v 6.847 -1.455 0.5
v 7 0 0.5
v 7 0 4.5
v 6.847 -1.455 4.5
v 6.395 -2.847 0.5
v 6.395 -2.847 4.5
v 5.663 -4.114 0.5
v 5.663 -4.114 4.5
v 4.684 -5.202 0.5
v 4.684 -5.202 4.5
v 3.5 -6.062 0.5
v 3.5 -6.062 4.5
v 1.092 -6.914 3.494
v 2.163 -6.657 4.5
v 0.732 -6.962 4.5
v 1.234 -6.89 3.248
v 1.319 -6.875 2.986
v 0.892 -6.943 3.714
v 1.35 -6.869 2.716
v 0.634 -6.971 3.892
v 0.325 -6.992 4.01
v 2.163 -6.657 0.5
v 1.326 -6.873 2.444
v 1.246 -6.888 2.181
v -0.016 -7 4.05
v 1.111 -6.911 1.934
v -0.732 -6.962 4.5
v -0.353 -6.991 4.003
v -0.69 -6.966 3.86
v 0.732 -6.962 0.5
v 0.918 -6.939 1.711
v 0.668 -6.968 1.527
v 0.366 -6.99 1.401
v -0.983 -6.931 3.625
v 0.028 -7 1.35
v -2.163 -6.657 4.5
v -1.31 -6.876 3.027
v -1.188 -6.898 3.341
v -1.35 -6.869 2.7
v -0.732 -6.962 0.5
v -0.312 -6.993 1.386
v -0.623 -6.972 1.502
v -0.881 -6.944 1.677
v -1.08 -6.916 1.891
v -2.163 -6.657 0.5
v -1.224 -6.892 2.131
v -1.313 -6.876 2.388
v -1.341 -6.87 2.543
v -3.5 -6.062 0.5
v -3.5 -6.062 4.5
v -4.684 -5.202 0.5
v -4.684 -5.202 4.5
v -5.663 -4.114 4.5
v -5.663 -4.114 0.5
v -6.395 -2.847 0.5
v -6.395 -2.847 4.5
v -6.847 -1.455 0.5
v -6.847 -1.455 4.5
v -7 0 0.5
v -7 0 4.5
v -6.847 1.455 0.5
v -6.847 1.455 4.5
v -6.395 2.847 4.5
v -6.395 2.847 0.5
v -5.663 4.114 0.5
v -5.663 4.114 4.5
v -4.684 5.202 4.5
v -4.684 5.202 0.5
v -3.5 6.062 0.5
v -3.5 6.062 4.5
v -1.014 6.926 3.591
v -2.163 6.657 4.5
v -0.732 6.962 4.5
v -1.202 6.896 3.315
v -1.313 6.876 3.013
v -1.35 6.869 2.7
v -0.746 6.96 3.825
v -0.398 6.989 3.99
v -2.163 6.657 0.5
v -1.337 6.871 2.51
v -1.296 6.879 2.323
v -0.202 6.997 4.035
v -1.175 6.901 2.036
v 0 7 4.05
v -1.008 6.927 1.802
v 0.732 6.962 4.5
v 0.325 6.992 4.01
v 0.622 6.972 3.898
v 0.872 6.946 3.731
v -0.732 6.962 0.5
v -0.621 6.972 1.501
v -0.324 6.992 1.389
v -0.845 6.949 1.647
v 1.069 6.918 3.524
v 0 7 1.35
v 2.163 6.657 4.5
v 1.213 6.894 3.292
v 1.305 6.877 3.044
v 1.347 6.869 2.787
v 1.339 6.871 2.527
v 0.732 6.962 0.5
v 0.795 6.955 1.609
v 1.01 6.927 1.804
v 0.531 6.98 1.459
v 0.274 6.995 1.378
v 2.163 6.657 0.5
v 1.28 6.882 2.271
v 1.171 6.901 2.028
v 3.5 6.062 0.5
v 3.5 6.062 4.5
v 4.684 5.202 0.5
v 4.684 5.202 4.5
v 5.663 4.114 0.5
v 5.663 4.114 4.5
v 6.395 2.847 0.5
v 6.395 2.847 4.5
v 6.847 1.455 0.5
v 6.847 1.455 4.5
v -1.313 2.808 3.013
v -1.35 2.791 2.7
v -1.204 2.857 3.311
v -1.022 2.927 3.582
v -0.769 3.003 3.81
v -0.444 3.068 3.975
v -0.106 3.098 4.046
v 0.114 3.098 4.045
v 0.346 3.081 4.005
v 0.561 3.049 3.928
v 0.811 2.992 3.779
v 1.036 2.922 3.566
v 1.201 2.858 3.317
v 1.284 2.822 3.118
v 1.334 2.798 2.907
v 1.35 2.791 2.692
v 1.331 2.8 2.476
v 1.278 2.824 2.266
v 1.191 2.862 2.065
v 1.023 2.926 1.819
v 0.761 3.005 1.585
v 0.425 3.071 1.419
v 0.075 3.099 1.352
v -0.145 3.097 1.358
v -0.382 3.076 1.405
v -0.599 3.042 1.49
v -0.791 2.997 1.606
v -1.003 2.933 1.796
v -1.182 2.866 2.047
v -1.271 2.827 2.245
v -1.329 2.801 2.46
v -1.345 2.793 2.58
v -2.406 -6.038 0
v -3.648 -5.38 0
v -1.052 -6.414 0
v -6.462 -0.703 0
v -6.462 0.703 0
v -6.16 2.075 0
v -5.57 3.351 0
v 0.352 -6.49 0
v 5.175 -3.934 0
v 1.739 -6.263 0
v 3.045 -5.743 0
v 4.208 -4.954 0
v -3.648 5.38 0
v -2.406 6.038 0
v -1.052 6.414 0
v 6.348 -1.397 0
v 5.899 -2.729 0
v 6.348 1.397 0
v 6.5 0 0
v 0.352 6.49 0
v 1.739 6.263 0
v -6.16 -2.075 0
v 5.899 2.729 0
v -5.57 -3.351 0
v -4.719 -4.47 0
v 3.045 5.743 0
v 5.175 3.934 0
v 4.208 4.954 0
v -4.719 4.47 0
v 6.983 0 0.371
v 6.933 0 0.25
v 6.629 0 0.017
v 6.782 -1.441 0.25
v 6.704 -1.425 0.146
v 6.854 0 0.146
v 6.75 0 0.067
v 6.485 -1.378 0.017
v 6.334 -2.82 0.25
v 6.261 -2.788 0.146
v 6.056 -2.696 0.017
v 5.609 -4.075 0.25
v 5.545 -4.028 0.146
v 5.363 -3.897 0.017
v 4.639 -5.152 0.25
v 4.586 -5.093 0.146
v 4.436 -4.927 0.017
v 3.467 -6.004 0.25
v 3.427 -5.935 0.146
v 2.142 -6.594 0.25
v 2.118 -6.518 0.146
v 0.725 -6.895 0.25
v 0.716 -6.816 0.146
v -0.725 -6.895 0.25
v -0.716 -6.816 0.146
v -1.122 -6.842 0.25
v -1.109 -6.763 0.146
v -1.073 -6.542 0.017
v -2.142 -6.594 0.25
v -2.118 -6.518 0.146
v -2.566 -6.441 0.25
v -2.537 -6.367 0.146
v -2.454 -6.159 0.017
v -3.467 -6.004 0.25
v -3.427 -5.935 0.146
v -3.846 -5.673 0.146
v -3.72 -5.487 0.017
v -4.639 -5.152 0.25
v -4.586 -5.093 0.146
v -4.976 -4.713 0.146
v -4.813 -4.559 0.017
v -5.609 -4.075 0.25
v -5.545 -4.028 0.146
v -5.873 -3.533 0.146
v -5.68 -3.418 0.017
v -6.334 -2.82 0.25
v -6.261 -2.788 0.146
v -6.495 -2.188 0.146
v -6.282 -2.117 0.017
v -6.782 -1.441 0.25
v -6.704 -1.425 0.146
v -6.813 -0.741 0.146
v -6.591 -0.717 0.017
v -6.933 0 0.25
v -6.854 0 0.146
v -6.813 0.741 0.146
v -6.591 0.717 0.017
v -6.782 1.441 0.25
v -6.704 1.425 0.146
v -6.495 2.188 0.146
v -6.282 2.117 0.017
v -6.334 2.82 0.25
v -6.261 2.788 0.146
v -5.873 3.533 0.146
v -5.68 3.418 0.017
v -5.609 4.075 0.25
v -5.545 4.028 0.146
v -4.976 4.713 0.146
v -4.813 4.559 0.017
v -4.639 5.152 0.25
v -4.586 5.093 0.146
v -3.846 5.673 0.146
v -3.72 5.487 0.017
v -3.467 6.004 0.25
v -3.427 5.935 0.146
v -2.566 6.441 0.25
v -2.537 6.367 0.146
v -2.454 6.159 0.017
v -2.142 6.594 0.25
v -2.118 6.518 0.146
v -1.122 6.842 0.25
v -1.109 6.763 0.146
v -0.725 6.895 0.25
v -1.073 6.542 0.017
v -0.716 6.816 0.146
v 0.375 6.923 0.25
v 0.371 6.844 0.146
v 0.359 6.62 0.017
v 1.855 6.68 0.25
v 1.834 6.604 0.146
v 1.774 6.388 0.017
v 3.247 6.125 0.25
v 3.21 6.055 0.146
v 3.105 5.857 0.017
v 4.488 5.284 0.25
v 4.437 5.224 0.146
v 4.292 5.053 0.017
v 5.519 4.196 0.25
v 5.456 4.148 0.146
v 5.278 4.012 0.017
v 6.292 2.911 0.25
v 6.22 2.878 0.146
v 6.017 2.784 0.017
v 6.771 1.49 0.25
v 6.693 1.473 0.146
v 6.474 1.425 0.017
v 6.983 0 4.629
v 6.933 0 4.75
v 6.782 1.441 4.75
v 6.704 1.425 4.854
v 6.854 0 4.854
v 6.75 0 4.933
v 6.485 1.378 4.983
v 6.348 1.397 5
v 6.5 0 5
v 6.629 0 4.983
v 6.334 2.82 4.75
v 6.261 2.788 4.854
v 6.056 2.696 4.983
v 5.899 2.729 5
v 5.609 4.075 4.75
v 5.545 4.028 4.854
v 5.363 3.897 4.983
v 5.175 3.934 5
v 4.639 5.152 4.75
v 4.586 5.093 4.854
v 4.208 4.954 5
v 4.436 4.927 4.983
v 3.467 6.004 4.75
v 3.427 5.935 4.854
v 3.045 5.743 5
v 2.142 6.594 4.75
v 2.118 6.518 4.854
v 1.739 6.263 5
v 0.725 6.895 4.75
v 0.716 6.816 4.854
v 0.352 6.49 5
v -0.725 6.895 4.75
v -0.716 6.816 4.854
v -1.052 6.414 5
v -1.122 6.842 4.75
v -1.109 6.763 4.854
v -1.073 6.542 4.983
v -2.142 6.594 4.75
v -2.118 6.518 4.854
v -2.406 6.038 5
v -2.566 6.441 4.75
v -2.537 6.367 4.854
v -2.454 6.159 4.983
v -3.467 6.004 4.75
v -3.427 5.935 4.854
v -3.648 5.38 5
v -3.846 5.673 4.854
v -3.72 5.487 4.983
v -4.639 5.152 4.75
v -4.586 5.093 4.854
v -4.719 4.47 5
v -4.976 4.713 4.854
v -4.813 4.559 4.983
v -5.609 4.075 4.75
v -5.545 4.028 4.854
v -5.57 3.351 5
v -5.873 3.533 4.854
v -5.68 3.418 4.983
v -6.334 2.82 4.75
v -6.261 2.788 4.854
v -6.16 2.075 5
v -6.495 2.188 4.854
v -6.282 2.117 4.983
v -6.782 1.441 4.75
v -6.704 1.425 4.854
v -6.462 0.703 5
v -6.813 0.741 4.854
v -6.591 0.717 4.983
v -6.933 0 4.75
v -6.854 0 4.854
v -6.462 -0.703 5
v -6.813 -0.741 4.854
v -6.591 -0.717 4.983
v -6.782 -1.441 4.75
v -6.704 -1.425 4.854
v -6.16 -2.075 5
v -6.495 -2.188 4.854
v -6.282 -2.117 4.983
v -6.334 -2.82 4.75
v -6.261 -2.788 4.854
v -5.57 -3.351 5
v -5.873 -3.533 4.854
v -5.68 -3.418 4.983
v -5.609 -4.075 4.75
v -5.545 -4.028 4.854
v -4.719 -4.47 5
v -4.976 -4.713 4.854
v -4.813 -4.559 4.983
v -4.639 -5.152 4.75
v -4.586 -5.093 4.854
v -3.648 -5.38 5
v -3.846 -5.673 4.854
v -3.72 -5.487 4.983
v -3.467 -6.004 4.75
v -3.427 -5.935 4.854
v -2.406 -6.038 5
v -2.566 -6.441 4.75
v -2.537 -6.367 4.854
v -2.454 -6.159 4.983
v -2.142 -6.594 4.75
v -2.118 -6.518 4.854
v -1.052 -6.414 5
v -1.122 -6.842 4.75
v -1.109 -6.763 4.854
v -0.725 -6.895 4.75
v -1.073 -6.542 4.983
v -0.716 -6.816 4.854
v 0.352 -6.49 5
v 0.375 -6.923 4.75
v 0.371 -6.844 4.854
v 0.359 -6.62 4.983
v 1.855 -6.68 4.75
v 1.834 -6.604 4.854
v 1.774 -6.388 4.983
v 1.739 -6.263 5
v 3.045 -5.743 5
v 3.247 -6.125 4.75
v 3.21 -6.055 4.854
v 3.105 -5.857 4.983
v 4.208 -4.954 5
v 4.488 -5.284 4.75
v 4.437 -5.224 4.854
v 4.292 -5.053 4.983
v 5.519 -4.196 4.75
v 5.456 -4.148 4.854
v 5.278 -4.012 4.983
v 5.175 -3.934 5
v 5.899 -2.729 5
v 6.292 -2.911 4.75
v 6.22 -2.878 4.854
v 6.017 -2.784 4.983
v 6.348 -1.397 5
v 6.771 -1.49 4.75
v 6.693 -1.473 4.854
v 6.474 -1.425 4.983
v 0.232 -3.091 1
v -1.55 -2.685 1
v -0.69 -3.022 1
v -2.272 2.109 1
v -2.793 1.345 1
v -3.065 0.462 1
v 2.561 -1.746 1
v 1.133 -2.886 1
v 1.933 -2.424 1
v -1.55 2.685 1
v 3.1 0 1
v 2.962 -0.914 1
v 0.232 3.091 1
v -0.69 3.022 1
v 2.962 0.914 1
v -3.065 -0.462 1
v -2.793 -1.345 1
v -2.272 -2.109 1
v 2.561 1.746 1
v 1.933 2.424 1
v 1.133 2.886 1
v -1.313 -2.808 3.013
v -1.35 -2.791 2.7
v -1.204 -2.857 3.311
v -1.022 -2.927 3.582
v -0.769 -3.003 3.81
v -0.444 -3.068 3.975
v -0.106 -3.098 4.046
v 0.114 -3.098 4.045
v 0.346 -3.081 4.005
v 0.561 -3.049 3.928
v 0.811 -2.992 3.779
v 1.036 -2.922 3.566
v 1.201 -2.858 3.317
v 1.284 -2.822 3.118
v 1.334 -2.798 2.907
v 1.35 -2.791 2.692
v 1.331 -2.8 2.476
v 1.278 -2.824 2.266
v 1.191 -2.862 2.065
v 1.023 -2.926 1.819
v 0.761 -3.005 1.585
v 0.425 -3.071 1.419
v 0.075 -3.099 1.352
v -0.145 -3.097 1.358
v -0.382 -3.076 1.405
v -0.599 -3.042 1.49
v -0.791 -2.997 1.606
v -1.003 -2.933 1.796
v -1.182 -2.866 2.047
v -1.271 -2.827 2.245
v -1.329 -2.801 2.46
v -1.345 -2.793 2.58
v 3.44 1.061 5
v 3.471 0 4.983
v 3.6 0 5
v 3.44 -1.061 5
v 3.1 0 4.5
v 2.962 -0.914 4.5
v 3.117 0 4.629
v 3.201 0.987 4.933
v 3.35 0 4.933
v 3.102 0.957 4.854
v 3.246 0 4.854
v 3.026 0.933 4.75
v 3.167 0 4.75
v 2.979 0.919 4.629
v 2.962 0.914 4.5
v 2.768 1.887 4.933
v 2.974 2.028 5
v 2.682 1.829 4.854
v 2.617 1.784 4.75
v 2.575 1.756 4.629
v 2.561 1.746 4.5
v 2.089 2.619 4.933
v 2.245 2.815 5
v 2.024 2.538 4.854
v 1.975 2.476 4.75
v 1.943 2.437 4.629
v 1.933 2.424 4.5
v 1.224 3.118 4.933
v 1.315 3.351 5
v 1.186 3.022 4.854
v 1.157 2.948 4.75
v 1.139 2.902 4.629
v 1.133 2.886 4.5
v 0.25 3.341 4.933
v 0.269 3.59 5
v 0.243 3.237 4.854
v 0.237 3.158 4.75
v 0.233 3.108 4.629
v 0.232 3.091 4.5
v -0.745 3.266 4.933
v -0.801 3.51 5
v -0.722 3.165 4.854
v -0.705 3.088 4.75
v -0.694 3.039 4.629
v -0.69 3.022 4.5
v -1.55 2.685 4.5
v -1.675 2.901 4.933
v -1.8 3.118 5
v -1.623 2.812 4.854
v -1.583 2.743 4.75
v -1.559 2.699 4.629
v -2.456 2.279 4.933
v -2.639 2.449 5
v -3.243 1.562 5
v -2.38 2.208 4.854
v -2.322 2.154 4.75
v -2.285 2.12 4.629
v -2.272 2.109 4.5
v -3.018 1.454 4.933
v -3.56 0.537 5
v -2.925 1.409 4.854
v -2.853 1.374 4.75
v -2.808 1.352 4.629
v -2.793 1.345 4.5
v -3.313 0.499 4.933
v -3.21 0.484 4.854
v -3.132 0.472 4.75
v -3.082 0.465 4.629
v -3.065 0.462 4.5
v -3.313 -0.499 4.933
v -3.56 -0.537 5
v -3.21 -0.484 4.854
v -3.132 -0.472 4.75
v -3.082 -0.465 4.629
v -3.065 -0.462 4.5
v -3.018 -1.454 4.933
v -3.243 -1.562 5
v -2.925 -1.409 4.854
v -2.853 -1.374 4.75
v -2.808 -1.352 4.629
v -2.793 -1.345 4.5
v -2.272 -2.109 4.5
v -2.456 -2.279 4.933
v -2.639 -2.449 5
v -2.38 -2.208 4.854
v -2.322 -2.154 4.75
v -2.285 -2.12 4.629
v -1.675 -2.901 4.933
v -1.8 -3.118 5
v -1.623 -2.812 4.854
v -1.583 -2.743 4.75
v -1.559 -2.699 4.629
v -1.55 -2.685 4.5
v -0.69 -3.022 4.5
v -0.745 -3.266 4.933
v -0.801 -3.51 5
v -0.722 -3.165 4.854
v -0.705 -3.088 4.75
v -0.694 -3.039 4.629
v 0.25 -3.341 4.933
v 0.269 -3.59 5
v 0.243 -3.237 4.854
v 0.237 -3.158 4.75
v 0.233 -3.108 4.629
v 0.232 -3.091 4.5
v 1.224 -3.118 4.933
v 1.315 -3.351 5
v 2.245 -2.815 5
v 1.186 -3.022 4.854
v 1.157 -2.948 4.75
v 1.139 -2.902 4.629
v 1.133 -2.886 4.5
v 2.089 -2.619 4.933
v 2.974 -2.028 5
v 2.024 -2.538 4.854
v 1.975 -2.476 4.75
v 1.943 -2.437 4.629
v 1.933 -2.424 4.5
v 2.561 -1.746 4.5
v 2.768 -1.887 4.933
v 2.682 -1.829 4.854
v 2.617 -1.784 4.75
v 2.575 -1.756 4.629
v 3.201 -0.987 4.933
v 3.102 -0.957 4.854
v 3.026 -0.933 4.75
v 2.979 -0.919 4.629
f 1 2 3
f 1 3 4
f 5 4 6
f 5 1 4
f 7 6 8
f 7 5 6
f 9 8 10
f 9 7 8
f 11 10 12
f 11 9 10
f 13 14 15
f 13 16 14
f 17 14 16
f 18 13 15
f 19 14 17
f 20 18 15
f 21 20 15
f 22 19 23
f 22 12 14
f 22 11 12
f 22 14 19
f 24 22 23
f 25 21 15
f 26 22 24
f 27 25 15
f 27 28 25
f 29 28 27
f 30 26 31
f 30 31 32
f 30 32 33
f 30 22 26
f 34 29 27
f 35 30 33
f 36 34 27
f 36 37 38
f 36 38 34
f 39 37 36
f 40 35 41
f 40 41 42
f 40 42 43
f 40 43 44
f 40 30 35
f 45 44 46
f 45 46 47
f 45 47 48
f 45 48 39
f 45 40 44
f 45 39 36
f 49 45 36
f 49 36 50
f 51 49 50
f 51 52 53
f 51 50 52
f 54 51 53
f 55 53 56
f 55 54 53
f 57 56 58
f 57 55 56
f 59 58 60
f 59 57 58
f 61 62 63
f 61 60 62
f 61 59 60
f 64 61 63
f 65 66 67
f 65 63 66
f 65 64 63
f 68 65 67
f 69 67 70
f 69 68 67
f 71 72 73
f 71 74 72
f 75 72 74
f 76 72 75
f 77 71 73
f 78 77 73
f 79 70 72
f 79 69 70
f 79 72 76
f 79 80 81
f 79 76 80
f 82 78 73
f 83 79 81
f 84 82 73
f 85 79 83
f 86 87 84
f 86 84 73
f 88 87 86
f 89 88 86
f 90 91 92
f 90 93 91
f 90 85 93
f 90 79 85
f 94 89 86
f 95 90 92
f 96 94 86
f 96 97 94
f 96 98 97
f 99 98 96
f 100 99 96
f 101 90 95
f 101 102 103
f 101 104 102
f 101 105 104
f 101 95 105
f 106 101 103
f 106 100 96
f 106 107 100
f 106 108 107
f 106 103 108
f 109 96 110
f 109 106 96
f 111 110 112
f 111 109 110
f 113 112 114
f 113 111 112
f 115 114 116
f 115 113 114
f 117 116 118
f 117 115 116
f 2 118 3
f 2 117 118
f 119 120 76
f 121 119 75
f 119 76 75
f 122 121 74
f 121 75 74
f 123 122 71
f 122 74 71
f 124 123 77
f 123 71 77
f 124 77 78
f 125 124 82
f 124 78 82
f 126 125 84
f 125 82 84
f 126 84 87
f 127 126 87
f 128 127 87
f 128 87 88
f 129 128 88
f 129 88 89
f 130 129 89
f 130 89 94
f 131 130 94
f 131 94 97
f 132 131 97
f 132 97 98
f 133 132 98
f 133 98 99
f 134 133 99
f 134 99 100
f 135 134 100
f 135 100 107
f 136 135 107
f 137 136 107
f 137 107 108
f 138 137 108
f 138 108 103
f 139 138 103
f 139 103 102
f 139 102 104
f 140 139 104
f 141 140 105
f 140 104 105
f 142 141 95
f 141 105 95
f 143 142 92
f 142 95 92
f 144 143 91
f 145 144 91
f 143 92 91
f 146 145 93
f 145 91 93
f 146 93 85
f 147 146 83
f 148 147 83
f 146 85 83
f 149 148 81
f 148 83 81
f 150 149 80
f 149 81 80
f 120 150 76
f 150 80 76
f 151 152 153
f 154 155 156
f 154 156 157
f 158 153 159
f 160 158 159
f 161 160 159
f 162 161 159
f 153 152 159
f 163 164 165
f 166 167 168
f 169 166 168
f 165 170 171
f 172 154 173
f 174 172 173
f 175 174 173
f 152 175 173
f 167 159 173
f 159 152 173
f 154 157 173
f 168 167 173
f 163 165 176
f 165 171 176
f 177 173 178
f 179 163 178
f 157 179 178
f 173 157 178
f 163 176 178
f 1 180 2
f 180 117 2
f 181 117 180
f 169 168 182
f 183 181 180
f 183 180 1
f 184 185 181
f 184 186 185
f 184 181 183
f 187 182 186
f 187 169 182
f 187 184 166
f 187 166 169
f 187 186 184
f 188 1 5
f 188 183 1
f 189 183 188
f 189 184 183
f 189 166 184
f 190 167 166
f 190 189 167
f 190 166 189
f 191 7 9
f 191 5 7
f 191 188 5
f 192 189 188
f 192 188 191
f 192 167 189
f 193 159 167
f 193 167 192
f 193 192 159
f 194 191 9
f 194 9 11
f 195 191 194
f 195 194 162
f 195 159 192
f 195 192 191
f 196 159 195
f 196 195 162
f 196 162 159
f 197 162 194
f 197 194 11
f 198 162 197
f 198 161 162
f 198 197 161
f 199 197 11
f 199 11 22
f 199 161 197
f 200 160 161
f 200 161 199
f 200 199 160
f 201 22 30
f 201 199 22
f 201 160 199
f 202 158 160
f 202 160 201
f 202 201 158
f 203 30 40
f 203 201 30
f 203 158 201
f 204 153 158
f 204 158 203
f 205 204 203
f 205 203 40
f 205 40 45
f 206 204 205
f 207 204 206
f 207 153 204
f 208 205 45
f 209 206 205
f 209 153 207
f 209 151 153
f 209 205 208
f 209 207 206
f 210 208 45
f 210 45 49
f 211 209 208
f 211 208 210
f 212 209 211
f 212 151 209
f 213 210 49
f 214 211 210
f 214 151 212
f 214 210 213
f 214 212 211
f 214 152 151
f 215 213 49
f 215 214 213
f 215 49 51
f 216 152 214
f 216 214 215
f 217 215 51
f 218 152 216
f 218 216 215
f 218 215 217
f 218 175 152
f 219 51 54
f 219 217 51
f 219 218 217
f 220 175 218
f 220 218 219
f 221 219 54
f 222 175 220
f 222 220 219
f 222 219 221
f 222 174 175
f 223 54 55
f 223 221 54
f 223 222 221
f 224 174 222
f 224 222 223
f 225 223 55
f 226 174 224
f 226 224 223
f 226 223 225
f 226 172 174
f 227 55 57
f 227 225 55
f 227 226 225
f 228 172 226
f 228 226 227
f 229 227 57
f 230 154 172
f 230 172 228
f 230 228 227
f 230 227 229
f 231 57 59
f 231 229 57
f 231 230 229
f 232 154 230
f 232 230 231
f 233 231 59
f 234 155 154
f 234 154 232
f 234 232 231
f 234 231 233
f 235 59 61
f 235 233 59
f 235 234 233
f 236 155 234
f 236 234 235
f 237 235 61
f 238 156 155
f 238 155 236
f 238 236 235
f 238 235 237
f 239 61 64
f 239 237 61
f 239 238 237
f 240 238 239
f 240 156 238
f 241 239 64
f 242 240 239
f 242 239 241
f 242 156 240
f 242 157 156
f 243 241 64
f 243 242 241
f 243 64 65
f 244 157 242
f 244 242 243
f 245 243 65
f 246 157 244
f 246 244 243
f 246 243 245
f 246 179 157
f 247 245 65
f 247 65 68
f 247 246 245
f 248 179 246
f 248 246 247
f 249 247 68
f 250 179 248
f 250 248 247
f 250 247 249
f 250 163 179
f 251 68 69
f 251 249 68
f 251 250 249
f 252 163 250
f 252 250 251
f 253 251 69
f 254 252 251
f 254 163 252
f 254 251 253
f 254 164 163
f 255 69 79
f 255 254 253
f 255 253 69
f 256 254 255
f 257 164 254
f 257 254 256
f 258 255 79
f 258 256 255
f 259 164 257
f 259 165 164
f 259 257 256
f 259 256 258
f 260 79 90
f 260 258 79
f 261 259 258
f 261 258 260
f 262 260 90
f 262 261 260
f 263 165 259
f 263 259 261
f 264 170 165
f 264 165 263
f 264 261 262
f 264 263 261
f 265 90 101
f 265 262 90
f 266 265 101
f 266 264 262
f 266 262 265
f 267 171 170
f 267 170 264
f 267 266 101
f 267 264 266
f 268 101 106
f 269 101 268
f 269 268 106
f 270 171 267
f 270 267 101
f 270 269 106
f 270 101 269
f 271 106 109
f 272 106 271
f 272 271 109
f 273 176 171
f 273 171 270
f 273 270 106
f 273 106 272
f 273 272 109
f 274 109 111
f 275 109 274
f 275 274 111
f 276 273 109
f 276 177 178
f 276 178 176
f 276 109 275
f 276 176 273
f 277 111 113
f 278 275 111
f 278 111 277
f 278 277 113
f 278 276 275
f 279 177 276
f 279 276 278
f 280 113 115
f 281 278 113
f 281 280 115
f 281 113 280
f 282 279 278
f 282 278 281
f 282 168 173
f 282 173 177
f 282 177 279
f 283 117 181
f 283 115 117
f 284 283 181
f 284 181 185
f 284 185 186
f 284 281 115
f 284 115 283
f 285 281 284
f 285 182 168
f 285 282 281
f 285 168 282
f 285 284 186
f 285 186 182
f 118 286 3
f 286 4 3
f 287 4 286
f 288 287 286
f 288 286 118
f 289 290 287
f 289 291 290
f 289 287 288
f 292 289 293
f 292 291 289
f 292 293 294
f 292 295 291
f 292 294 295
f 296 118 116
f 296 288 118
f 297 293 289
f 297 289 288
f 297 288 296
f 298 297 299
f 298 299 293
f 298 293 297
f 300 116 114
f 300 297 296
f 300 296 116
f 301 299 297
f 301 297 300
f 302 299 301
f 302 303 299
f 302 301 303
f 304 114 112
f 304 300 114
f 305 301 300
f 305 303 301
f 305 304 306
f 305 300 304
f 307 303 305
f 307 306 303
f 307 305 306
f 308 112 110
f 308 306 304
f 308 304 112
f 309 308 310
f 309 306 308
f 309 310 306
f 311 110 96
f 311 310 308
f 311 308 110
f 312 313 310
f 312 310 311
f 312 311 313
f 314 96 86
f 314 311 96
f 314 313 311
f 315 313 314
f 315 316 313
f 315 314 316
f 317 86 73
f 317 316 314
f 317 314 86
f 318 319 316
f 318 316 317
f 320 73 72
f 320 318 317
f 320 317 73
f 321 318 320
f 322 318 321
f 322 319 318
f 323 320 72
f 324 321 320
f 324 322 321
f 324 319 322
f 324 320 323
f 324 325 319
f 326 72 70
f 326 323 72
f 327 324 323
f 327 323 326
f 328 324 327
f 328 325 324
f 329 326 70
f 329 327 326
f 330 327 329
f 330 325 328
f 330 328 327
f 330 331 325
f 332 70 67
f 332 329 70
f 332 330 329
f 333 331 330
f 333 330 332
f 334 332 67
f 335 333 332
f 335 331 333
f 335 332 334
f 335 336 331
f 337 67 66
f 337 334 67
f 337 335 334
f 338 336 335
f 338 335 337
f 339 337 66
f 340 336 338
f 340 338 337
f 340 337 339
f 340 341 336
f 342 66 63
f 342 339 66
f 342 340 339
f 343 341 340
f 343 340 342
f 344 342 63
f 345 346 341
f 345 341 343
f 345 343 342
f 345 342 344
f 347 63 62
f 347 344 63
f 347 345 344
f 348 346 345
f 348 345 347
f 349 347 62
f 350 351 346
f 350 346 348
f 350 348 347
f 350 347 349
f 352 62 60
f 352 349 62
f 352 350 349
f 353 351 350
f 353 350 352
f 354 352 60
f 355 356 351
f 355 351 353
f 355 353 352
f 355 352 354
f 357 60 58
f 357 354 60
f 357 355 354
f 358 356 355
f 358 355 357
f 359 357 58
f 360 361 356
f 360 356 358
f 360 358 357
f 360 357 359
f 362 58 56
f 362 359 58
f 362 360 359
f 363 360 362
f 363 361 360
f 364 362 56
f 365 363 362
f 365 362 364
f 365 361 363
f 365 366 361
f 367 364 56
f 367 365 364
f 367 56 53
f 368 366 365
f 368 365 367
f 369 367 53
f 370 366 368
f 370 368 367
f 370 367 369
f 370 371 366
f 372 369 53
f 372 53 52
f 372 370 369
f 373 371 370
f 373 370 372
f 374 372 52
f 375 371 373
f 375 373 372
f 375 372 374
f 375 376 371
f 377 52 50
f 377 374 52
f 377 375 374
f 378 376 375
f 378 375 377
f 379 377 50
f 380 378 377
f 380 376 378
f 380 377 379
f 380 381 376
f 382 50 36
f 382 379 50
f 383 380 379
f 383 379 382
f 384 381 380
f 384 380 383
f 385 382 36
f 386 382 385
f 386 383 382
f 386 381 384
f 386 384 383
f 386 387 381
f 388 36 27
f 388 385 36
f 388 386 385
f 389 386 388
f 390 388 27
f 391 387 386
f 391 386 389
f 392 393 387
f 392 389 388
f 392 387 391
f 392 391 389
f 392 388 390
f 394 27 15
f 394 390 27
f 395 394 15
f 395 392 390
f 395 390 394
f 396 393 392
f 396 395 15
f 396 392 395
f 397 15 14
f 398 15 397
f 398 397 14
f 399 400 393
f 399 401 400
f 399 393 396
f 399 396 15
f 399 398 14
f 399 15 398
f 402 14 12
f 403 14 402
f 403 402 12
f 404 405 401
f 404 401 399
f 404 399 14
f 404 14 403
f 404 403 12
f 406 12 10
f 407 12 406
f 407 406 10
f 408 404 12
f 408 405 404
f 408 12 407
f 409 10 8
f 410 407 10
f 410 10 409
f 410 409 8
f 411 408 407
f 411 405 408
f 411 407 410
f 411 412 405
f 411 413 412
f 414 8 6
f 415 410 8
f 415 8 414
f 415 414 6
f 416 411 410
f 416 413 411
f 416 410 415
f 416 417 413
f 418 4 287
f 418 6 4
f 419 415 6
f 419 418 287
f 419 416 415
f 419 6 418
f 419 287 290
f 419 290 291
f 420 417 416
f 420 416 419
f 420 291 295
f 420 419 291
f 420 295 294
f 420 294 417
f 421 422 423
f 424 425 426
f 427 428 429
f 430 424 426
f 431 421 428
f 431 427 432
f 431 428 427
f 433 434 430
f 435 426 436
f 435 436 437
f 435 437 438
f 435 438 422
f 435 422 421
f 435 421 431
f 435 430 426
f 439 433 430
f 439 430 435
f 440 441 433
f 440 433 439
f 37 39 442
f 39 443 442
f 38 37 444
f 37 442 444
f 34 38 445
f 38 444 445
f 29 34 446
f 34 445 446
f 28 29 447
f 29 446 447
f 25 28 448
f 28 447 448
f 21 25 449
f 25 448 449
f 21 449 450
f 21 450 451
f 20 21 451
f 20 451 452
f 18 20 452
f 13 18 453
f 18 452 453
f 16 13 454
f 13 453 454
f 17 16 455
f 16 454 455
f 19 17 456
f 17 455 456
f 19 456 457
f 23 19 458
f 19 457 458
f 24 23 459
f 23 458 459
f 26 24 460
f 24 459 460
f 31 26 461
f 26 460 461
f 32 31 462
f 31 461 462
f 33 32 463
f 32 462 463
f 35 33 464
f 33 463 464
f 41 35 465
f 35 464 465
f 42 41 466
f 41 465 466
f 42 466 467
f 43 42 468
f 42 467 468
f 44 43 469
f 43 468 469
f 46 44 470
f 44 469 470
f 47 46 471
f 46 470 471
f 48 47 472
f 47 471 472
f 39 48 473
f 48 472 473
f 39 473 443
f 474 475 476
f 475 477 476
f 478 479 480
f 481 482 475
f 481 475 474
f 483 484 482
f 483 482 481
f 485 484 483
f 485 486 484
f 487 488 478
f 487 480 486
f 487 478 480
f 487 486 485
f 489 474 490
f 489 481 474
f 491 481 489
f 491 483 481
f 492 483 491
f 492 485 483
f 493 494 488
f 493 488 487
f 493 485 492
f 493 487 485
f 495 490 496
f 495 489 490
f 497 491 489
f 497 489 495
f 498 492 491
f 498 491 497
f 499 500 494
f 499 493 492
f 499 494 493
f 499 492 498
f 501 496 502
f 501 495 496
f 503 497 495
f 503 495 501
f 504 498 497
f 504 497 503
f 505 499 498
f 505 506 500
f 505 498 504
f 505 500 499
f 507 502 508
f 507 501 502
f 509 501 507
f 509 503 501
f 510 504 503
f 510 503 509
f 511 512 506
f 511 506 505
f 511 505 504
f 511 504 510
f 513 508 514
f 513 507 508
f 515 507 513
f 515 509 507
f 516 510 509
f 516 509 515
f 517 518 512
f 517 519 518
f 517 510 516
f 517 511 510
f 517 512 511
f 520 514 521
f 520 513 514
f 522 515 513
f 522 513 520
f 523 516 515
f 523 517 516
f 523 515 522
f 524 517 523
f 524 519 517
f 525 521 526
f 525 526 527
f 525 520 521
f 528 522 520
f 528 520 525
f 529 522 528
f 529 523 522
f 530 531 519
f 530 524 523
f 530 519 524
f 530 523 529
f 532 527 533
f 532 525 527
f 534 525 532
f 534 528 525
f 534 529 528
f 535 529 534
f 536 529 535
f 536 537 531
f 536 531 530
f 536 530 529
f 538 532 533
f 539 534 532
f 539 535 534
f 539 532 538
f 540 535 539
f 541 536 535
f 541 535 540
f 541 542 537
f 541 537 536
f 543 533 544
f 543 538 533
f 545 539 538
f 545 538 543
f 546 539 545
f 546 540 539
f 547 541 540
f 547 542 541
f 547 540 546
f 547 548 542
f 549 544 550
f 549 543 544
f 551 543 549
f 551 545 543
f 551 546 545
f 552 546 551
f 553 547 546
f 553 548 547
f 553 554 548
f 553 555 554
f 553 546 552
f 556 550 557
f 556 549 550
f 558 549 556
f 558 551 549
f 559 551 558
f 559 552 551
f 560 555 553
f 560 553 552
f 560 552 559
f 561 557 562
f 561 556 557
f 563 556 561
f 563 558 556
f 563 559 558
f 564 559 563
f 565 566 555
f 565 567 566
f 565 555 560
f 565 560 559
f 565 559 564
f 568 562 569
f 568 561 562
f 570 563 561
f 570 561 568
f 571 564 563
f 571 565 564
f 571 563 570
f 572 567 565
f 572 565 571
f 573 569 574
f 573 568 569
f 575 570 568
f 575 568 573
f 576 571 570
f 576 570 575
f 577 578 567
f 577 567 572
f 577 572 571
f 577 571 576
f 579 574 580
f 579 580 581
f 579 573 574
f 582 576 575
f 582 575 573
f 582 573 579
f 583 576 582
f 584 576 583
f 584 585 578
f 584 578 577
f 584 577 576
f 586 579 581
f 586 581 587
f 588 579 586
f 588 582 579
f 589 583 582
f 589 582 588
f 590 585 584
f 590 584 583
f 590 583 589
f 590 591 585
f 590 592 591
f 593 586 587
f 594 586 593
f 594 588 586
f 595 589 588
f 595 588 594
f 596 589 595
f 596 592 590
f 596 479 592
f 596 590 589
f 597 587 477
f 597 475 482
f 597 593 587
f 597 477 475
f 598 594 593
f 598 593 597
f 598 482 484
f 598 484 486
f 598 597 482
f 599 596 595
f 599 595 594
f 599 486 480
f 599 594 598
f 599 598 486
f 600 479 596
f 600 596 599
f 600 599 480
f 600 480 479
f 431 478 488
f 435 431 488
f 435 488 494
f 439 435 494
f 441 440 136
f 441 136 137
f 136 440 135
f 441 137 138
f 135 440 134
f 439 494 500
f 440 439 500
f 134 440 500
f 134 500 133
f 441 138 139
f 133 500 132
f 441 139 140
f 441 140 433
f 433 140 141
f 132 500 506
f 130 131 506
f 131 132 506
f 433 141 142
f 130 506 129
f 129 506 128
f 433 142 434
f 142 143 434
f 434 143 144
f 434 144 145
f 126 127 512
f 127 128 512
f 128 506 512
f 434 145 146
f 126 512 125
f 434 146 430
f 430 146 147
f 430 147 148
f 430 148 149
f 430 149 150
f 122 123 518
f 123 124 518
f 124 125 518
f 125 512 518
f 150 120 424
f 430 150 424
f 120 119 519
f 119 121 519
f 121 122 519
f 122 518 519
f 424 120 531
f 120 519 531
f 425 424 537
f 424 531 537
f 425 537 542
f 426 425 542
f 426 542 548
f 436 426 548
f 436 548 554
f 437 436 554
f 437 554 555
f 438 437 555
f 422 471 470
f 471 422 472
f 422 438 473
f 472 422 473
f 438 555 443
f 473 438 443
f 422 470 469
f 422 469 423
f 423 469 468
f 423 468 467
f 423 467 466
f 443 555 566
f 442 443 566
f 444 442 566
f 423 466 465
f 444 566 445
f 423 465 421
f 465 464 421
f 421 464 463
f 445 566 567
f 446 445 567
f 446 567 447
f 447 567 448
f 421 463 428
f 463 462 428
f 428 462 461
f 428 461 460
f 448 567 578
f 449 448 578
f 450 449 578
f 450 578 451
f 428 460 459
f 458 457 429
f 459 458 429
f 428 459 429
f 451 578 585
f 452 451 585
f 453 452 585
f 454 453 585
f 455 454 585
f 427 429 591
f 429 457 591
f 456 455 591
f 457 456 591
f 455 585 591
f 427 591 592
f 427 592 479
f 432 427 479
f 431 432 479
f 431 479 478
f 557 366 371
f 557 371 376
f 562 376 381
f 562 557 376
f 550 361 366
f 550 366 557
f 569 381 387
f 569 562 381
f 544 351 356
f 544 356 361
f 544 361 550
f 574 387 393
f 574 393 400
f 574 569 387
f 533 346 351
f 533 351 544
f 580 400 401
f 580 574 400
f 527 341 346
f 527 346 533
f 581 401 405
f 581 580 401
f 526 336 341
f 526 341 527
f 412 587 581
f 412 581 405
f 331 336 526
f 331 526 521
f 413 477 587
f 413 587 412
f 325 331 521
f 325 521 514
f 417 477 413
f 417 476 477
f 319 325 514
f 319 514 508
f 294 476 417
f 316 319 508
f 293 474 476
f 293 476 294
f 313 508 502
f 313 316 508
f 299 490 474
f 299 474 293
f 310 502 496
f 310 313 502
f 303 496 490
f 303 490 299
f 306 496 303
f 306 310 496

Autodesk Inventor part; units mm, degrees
ref_plane "YZ Plane" through (0, 0, 0) normal (1, 0, 0) x (0, 1, 0)
sketch "Эскиз1" plane through (0, 0, 0) normal (0, 0, 1) x (1, 0, 0)
  circle A0 centre (0, 0) radius 7
  dimension "d0" = 14
extrude "Выдавливание1" add sketch "Эскиз1" along normal blind 5
fillet "Сопряжение1" radius 0.5 2 edges at (-7, 0, 5) (-7, 0, 0)
ref_plane "РабПлоскость1" through (0, 0, 5) normal (0, 0, 1) x (1, 0, 0)
sketch "Эскиз2" plane through (0, 0, 5) normal (0, 0, 1) x (1, 0, 0)
  circle A0 centre (0, 0) radius 3.1
  dimension "d5" = 6.2
extrude "Выдавливание2" cut sketch "Эскиз2" against normal blind 4
fillet "Сопряжение2" radius 0.5 1 edges at (-3.1, 0, 5)
ref_plane "РабПлоскость2" through (0, 7, 0) normal (0, 1, 0) x (-1, 0, 0)
sketch "Эскиз3" plane through (0, 7, 0) normal (0, 1, 0) x (-1, 0, 0)
  circle A0 centre (0, 2.7) radius 1.35
  point P0 (0, 0)
  dimension "d10" = 2.7
  dimension "d11" = 2.7
extrude "Выдавливание3" cut sketch "Эскиз3" against normal through all
thread "Резьба1" size "M3x0.5" class "6H" standard "ANSI Metric M Profile" full length
thread "Резьба2" size "M3x0.5" class "6H" standard "ANSI Metric M Profile" full length
properties part number "опора"
